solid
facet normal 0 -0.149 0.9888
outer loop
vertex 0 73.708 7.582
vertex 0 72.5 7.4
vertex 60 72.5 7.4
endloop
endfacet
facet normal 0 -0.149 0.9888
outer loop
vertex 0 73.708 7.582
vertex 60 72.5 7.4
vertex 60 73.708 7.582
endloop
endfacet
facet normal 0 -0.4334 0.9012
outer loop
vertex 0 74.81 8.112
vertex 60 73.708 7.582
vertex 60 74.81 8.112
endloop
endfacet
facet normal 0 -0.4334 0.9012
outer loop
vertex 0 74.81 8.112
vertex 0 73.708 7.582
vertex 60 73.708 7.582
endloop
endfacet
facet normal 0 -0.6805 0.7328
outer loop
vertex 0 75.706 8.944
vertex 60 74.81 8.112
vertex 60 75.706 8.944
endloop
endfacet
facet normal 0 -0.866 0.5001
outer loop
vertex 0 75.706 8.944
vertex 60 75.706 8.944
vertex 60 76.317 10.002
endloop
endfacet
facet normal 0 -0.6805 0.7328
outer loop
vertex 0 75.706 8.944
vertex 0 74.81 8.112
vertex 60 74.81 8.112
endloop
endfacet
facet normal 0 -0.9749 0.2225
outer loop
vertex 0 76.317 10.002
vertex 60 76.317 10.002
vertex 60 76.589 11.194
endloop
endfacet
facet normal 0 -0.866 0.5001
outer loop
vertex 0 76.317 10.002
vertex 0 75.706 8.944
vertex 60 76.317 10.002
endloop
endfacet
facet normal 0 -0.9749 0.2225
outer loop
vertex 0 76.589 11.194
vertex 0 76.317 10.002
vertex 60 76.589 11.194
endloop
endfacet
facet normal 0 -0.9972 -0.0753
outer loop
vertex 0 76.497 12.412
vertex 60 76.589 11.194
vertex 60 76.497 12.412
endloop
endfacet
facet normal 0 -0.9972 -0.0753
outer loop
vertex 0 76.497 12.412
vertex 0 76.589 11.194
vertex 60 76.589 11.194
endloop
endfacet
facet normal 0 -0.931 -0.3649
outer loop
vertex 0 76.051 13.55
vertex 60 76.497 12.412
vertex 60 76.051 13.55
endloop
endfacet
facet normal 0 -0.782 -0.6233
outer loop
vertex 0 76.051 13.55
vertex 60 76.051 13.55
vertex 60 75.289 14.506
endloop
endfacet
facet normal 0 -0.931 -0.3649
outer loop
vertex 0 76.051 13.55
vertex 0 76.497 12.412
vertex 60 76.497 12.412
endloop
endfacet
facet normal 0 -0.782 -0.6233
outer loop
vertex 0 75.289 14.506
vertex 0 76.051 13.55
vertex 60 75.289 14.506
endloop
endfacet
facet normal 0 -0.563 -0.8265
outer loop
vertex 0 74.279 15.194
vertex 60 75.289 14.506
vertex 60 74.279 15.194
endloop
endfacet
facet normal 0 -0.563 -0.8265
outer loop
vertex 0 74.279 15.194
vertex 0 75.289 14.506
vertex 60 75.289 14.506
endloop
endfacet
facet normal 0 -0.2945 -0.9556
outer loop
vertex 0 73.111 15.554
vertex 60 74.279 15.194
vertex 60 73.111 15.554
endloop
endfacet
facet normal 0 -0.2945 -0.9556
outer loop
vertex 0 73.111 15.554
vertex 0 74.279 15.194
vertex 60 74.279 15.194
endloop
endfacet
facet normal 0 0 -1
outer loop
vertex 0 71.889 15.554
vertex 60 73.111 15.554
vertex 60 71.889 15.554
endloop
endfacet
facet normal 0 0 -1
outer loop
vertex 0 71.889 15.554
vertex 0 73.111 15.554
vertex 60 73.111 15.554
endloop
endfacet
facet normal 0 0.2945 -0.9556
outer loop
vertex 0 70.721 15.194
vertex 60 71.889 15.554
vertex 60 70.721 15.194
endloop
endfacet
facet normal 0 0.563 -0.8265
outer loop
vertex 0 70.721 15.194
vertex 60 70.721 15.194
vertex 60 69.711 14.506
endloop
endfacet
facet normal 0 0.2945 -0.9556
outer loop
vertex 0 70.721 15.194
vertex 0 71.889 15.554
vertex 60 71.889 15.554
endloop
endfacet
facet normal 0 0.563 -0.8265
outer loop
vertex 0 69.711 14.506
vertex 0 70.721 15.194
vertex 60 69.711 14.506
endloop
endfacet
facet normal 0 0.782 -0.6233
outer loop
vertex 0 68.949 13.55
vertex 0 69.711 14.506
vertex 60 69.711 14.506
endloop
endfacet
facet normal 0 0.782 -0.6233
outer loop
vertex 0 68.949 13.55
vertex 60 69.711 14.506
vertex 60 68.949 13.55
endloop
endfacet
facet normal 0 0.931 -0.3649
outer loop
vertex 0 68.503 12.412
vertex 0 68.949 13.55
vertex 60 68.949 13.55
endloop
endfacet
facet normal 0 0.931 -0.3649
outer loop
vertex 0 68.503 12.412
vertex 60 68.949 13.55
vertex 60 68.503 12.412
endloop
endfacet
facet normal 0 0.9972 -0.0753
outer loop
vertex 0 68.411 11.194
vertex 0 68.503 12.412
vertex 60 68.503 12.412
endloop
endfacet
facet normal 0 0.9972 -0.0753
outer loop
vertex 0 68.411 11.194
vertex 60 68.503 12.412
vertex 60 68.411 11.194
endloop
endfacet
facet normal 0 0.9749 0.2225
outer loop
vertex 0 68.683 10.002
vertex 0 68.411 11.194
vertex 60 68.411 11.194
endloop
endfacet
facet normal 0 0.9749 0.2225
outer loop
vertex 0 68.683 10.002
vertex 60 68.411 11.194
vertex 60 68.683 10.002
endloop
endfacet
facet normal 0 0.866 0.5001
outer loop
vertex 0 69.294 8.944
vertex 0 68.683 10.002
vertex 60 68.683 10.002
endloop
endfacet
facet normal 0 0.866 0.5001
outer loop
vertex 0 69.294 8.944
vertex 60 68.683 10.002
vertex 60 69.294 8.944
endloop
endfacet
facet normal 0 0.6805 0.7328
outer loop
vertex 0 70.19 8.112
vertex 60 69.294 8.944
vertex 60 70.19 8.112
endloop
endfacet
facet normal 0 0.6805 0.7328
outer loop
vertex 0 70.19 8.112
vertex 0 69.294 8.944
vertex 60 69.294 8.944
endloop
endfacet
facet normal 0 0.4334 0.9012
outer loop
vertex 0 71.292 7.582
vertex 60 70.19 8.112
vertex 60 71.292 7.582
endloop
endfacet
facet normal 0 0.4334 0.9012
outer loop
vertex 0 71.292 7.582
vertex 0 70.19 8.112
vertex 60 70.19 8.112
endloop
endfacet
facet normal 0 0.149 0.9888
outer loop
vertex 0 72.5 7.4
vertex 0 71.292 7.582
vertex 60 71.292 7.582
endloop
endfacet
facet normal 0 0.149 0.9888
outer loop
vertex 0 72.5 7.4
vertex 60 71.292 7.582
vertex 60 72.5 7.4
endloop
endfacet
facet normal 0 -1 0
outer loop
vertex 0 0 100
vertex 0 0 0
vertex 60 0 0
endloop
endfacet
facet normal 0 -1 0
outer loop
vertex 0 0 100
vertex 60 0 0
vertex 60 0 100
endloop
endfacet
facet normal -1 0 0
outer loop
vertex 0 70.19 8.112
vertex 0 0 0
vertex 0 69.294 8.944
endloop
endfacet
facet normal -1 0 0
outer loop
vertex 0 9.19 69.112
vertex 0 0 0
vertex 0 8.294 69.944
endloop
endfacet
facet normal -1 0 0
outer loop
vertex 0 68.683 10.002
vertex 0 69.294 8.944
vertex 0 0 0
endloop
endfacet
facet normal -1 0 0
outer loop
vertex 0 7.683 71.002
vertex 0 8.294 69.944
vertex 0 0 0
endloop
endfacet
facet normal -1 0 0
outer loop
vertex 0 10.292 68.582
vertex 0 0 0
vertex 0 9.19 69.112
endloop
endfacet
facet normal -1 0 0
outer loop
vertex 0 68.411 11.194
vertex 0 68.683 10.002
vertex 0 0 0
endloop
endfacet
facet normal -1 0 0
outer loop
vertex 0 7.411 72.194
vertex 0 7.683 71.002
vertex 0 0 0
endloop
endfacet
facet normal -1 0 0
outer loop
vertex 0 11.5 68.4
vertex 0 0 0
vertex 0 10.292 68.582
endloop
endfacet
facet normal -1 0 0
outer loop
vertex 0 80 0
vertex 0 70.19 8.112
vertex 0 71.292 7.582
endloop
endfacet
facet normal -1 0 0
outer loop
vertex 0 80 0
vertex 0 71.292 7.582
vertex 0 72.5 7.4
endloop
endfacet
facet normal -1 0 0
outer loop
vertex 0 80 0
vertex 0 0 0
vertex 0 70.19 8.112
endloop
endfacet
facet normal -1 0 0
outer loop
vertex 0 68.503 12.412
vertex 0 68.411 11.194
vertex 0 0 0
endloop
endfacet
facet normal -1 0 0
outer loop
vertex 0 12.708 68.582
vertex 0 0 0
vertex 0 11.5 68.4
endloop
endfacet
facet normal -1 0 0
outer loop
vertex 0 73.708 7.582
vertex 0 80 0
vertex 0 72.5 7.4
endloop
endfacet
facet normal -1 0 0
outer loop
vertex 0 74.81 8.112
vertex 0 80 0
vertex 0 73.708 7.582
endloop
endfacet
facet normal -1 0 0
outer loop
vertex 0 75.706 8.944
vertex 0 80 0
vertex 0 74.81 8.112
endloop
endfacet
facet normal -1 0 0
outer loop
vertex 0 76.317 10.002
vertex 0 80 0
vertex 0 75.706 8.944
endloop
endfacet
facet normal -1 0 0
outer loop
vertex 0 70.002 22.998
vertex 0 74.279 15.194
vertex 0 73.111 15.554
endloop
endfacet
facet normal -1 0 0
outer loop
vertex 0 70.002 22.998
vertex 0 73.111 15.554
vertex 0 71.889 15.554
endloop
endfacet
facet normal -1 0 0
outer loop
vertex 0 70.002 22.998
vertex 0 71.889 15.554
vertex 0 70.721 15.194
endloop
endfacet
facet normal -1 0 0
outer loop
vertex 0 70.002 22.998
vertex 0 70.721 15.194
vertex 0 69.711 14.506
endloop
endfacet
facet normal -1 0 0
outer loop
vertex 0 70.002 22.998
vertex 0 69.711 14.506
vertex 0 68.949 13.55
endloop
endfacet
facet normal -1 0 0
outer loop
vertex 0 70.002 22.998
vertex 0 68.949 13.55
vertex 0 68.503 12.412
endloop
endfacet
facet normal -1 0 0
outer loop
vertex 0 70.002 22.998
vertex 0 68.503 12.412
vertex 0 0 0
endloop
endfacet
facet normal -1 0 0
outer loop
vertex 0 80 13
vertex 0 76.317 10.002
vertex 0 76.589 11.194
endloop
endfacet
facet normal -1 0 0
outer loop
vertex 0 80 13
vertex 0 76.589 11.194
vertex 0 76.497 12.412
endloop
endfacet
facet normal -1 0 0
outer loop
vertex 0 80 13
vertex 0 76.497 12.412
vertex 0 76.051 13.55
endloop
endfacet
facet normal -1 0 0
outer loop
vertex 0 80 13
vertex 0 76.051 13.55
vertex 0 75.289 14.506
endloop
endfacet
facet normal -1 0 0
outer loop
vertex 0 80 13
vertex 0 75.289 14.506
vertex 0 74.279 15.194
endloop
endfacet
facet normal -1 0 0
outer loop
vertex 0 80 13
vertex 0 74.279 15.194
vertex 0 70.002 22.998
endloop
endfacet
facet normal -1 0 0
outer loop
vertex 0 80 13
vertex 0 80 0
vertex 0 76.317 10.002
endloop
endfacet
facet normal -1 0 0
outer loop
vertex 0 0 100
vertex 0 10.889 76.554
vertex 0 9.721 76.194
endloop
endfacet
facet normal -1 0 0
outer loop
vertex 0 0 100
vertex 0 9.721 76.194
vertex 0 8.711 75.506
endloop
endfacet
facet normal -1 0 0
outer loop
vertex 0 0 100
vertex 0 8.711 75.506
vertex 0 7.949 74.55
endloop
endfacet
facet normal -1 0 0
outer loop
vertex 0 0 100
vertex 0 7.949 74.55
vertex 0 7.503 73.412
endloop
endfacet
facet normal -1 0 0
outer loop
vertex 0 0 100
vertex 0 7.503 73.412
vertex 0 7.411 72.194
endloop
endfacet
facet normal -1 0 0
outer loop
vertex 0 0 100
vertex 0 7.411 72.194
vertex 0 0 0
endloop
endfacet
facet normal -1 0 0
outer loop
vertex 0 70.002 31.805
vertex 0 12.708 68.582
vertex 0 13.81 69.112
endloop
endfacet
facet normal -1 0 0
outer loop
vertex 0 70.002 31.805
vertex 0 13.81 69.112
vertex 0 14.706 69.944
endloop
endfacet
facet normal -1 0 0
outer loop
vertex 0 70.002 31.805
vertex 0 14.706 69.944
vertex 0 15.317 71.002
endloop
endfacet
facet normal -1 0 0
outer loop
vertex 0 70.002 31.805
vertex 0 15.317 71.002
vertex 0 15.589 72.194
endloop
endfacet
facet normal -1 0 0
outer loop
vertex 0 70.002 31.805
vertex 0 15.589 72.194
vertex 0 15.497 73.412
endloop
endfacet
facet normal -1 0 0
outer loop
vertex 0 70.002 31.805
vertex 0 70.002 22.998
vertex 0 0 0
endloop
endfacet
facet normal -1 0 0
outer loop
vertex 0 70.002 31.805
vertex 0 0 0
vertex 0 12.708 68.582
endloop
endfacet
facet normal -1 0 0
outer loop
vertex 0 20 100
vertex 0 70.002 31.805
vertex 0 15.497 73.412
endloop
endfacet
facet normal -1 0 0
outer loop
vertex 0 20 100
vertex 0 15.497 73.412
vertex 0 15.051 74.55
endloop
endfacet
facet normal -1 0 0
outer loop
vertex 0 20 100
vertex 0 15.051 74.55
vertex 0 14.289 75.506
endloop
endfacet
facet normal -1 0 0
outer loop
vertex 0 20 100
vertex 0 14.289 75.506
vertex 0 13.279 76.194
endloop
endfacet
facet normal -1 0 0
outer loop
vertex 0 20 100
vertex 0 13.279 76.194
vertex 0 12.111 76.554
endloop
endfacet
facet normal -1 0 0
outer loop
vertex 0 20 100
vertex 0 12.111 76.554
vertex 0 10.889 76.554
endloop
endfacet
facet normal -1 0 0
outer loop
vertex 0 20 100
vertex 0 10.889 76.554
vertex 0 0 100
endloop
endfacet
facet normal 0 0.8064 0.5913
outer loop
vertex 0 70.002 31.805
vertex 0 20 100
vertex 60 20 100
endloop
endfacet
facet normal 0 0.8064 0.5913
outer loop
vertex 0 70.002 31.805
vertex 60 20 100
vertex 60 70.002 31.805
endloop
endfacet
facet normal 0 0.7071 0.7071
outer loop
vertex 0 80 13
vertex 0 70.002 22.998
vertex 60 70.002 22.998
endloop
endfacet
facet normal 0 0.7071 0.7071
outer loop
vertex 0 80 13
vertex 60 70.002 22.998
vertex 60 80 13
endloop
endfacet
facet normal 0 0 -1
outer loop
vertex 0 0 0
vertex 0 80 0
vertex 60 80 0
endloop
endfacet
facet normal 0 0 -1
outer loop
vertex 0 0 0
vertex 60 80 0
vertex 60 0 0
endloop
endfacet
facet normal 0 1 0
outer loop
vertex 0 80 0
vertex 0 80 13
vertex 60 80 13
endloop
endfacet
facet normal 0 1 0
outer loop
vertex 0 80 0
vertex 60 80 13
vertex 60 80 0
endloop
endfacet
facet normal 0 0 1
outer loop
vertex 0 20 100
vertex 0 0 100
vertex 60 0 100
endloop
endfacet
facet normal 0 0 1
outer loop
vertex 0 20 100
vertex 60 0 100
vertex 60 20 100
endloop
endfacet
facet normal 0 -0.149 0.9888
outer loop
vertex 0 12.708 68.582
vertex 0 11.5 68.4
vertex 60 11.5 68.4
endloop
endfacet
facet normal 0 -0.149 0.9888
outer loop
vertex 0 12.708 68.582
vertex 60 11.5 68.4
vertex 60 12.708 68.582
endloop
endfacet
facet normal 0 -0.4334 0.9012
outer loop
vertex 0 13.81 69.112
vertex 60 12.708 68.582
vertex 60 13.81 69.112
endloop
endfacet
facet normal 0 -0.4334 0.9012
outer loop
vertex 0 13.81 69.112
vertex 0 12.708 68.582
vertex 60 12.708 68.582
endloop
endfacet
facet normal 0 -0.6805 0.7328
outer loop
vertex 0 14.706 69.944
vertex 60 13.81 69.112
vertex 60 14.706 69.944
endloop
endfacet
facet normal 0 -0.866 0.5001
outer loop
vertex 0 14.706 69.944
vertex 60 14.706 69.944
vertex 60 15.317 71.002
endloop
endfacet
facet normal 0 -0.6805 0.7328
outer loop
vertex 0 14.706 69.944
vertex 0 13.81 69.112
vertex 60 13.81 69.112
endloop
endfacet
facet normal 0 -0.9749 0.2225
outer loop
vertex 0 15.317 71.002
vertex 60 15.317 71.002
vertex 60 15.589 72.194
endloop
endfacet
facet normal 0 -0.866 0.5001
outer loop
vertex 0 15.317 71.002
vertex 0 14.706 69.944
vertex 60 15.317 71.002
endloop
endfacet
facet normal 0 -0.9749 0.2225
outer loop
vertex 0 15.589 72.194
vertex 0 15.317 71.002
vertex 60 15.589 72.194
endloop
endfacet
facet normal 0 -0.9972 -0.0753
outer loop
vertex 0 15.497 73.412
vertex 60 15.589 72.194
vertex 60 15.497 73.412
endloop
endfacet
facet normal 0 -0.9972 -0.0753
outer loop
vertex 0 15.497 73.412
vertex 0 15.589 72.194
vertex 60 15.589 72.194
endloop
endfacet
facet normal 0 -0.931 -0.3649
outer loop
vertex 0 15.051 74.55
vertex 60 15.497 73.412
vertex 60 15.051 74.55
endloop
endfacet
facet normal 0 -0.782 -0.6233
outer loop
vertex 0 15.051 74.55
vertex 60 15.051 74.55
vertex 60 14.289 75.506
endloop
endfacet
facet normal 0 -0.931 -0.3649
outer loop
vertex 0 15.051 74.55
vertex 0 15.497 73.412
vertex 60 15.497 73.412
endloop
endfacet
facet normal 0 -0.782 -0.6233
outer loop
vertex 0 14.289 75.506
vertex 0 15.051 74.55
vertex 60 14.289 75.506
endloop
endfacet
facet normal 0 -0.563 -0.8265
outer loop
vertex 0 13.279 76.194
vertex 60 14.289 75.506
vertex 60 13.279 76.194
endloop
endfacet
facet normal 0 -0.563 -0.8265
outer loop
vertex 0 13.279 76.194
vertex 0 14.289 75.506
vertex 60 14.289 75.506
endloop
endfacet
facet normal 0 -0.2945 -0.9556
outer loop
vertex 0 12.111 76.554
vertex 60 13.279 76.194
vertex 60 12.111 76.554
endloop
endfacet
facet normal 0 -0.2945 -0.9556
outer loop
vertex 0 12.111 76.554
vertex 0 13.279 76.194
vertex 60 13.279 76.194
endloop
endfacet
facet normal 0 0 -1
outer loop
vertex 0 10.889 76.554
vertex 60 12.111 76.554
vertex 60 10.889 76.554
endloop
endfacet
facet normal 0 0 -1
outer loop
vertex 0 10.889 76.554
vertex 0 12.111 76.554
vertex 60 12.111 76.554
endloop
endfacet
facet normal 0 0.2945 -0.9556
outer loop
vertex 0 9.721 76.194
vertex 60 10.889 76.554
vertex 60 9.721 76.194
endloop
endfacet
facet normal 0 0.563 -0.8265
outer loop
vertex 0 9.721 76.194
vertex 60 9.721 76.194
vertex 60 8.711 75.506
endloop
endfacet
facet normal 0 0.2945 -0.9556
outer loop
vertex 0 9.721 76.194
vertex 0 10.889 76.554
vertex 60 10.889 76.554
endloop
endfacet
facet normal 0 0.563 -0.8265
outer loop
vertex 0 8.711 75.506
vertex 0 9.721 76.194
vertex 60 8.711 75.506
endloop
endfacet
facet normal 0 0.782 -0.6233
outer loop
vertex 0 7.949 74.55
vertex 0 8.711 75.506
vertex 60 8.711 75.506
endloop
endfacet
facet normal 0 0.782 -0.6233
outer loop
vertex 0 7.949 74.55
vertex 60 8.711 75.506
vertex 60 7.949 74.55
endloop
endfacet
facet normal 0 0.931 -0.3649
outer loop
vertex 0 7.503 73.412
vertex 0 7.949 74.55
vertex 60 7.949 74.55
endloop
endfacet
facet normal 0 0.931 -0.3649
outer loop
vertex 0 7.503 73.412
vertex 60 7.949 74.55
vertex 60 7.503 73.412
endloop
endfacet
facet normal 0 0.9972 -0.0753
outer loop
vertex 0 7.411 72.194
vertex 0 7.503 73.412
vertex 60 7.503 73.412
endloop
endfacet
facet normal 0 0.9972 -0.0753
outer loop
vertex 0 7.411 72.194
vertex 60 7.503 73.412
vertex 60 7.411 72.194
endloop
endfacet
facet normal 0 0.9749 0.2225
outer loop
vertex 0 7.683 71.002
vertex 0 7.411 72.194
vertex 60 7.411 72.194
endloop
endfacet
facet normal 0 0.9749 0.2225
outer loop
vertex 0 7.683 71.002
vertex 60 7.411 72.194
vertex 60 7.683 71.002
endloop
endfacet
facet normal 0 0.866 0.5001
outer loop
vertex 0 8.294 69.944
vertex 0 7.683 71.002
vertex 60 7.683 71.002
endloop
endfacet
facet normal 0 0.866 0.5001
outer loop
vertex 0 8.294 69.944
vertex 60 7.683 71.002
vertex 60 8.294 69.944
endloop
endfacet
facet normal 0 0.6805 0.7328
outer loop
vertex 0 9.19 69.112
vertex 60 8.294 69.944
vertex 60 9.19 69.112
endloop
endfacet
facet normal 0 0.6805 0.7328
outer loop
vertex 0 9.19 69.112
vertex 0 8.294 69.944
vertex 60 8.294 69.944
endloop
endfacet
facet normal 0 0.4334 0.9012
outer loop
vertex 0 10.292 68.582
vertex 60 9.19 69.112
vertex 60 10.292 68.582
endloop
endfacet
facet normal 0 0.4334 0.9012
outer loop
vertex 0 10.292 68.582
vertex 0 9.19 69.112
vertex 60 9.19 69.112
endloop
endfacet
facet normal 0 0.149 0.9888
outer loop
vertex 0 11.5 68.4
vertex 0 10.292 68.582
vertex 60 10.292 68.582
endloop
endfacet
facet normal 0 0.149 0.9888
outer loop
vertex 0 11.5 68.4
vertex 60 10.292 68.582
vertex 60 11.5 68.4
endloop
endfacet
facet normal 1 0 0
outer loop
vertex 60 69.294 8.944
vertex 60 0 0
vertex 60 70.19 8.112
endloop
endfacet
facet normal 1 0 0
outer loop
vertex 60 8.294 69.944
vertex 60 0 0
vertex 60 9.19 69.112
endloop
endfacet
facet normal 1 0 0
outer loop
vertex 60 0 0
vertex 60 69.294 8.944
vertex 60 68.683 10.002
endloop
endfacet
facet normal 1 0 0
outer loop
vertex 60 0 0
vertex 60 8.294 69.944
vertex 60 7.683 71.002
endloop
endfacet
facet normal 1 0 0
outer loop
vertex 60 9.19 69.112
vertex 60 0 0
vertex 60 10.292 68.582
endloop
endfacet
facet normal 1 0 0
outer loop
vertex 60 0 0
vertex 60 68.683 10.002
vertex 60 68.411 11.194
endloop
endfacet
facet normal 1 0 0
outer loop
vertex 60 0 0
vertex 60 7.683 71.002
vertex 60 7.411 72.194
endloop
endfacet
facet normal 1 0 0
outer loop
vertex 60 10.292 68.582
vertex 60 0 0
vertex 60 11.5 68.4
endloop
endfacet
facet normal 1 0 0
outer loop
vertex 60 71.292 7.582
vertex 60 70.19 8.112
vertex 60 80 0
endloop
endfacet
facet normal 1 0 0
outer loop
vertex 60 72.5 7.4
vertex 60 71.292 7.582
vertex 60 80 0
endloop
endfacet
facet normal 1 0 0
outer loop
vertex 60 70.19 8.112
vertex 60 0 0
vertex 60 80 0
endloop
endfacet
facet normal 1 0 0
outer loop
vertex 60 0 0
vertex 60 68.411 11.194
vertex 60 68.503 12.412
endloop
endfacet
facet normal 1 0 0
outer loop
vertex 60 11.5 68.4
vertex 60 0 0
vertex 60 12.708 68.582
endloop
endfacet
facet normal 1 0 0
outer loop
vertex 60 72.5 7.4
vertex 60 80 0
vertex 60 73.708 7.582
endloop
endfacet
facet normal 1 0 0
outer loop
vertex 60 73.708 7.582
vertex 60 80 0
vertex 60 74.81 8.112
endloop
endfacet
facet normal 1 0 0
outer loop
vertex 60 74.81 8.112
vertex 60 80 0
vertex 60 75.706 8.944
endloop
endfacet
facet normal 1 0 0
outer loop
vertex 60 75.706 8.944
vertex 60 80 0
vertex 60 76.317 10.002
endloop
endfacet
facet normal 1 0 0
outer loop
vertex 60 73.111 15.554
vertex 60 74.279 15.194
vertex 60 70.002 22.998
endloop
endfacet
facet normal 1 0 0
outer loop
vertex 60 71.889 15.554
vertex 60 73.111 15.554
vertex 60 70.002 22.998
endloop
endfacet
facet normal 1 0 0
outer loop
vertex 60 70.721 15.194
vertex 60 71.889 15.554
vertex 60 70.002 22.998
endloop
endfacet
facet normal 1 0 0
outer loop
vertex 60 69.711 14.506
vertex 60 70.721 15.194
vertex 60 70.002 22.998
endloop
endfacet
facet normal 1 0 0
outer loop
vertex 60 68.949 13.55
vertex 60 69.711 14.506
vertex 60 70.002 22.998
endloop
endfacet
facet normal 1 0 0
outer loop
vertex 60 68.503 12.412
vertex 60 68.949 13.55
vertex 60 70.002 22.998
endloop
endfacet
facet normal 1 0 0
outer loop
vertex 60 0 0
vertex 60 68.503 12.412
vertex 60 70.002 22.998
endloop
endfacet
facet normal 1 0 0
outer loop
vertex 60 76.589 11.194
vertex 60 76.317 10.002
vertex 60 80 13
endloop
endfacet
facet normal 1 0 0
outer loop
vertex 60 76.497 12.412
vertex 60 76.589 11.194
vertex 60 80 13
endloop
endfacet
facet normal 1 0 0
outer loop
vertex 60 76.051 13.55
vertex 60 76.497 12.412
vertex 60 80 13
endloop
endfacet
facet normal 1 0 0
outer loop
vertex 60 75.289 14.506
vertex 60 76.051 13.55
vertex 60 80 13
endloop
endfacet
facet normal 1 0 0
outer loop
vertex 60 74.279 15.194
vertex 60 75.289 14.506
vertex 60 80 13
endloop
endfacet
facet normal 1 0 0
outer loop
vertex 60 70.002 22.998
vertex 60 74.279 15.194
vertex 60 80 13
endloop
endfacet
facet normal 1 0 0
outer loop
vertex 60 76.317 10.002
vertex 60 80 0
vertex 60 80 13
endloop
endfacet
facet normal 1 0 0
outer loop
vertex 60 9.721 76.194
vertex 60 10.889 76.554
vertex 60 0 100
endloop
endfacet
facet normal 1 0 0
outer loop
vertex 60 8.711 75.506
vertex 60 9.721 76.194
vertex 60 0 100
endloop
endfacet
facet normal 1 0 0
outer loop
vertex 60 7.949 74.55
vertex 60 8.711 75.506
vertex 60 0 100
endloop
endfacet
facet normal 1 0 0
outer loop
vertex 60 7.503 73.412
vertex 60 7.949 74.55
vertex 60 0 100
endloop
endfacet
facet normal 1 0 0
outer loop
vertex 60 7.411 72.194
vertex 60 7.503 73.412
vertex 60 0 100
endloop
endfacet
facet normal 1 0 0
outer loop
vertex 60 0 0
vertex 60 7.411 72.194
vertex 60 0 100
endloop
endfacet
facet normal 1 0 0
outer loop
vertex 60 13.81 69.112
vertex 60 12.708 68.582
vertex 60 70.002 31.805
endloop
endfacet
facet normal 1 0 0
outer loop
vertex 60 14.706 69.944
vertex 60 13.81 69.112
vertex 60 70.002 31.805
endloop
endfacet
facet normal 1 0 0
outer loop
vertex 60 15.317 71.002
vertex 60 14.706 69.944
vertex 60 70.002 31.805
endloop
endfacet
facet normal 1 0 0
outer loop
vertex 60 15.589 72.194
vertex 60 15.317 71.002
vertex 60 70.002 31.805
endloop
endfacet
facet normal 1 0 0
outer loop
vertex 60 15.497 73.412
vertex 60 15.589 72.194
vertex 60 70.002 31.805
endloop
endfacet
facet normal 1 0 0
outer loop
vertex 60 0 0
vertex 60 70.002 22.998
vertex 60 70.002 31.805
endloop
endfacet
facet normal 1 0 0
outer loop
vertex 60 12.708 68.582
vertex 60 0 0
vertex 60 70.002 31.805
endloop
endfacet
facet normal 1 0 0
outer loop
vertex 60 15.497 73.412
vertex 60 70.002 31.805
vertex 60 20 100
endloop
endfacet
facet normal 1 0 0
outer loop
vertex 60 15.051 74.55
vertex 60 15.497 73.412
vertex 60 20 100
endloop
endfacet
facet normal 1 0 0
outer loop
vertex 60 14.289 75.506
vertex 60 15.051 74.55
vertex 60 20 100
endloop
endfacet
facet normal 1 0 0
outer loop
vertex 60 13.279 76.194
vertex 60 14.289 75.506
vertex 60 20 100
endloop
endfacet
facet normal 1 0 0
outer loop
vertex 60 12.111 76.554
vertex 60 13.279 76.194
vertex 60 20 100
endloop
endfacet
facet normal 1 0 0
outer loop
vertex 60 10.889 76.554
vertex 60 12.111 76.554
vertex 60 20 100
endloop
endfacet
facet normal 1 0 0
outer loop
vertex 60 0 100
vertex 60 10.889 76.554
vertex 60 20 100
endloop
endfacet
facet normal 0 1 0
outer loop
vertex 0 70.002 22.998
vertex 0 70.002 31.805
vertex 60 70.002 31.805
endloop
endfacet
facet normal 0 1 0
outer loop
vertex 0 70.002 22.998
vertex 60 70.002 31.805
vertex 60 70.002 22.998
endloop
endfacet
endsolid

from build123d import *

# Parameters (mm, degrees)
SKETCH1_R           = 4.1
BOSS_EXTRUDE1_DEPTH = 60


with BuildPart() as part:
    # Sketch1 → Boss-Extrude1 (new body)
    with BuildSketch(Plane(origin=(0, 0, 0), x_dir=(0, 0, -1), z_dir=(1, 0, 0))):
        Polygon((0, 0), (-100, 0), (-100, 20), (-31.805308068, 70.001510114), (-22.998489886, 70.001510114), (-13, 80), (0, 80), align=None)
        with Locations((-11.5, 72.5)):
            Circle(SKETCH1_R, mode=Mode.SUBTRACT)
        with Locations((-72.5, 11.5)):
            Circle(SKETCH1_R, mode=Mode.SUBTRACT)
    extrude(amount=BOSS_EXTRUDE1_DEPTH)


solid = part.part
